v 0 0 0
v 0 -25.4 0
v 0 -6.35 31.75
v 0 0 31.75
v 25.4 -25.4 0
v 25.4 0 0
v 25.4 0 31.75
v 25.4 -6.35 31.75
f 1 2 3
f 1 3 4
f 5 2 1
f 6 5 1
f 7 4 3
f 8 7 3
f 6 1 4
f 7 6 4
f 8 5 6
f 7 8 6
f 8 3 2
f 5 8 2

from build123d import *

# Parameters (mm, degrees)
F1_DEPTH = 31.75
F4_DEPTH = 25.4


with BuildPart() as f1:
    # F0 (on Top) → F1 (new body)
    with BuildSketch(Plane.XY):
        Polygon((-6.35, 0), (0, 0), (0, 38.1), (-25.4, 38.1), (-25.4, 25.4), (-6.35, 25.4), align=None)
    extrude(amount=F1_DEPTH)


with BuildPart() as f4:
    # F3 (on Right) → F4 (new body)
    with BuildSketch(Plane.YZ):
        Polygon((-25.4, 0), (0, 0), (0, 31.75), (-6.35, 31.75), align=None)
    extrude(amount=F4_DEPTH)


solid = f4.part
